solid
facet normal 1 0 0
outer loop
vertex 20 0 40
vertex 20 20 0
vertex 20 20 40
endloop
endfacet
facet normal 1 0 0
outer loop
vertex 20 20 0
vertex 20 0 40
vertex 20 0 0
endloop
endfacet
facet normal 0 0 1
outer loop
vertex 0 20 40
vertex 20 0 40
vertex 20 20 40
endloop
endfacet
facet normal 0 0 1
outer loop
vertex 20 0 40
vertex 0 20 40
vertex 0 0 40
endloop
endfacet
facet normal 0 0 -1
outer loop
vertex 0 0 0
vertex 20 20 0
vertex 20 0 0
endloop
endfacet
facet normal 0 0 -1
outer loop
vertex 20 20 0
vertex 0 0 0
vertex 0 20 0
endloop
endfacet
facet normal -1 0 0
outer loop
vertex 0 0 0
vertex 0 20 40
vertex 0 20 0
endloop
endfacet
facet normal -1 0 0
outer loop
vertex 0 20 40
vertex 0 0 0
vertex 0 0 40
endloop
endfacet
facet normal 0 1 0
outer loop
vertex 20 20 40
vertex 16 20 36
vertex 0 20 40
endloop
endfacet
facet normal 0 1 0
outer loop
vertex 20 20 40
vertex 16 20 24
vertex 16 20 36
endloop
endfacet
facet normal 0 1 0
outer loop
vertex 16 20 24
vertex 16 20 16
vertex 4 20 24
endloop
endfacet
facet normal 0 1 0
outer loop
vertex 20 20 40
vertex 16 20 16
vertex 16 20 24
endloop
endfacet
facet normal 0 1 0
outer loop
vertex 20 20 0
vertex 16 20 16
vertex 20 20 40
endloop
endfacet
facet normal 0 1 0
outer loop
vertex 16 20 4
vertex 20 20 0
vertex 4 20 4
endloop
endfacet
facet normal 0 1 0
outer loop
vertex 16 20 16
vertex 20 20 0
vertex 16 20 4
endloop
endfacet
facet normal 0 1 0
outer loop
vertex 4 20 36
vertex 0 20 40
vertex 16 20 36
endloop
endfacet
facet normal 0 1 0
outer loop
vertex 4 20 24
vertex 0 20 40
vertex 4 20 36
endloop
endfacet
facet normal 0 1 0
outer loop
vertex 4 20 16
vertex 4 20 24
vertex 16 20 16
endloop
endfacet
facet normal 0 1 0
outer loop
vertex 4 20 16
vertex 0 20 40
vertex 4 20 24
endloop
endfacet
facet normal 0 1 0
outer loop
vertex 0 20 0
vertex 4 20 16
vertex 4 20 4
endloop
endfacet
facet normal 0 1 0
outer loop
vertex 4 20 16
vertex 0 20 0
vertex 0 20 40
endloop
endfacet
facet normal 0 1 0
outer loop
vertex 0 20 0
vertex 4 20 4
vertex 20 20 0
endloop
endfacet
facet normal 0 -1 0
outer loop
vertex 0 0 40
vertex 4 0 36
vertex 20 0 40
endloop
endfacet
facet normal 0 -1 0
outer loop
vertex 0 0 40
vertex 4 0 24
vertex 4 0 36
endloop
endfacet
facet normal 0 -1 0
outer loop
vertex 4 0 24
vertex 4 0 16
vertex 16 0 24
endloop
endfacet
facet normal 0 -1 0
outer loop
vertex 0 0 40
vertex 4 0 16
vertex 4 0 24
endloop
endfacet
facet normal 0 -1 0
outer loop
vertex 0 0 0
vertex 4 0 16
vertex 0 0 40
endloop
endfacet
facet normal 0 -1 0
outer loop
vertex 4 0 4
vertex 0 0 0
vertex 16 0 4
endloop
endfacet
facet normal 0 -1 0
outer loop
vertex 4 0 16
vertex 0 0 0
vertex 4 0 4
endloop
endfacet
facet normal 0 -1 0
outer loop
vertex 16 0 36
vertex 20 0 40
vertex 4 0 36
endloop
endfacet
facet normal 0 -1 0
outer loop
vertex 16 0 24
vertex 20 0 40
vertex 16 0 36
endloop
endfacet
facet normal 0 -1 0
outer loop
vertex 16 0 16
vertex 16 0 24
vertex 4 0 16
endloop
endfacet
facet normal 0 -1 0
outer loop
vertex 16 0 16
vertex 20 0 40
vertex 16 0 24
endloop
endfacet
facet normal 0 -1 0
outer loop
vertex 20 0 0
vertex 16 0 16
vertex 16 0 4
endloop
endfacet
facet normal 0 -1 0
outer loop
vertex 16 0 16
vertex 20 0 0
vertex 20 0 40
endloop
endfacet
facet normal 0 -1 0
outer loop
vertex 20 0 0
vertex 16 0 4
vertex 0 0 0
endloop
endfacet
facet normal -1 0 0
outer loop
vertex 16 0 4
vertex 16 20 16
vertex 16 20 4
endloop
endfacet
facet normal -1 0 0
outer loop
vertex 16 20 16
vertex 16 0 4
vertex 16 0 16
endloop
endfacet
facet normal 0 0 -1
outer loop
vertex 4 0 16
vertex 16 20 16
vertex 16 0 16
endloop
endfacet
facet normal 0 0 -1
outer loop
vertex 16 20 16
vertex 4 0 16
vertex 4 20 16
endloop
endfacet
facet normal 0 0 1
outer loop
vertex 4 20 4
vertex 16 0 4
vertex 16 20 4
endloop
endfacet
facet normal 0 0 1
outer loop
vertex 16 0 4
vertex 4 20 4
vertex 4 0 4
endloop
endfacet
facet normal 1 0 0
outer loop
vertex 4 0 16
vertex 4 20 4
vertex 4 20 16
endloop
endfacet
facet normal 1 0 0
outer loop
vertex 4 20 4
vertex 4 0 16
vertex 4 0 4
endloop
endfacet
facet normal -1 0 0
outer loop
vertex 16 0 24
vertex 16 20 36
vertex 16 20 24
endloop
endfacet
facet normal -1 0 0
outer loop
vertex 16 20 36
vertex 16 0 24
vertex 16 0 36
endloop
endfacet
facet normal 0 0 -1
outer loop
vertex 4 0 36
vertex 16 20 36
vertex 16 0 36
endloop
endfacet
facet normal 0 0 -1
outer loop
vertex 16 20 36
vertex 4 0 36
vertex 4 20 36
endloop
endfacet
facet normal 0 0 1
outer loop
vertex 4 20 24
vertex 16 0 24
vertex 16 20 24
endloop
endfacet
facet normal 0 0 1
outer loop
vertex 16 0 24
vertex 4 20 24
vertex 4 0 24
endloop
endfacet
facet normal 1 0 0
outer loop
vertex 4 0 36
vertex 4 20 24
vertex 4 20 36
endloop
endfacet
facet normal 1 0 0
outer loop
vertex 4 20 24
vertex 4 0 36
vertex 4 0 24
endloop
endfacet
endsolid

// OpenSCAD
difference()
{
	translate([0,0,0]) cube([20,20,40]);
	translate([4,-1,4]) cube([12,25,12]);
	translate([4,-1,24]) cube([12,25,12]);
}
